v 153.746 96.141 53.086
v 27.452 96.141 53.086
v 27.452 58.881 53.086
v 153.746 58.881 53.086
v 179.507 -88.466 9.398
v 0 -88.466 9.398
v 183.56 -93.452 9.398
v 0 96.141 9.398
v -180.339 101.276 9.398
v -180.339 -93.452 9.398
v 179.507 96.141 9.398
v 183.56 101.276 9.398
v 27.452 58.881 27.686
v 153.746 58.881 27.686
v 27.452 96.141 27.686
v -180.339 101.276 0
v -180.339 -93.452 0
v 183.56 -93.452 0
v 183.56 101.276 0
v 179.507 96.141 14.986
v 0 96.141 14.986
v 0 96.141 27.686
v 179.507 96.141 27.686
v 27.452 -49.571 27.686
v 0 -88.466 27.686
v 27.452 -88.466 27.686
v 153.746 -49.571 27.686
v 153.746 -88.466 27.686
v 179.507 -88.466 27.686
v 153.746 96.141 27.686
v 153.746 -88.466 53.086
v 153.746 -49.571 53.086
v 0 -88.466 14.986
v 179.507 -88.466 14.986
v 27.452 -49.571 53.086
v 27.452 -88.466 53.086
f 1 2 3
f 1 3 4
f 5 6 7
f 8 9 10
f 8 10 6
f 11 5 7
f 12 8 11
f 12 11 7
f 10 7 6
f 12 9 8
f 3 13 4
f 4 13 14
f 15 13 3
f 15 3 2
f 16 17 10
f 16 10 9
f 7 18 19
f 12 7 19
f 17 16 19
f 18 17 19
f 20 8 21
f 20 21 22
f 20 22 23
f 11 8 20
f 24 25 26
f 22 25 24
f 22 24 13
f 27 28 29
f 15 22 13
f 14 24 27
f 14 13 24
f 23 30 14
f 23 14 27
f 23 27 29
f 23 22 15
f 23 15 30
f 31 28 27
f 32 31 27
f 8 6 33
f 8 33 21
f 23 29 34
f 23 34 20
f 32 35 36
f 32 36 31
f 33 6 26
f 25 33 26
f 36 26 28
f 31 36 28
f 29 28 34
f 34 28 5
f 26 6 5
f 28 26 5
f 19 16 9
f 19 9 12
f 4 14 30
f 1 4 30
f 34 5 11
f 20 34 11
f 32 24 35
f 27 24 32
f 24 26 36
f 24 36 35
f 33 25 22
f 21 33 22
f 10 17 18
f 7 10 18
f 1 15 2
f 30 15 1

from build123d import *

# Parameters (mm, degrees)
F1_W      = 179.506913
F1_H      = 184.607744
F2_DEPTH  = 14.986
F2_FACE_W = 179.506912
F2_FACE_H = 184.607744
F3_DEPTH  = 12.7
F4_W      = 126.293604
F4_H      = 37.260275
F4_H_2    = 38.89557
F5_DEPTH  = 25.4
F0_W      = 363.899439
F0_H      = 194.727853
F6_DEPTH  = 9.398


with BuildPart() as f2:
    # F1 (on face) → F2 (new body)
    with BuildSketch(Plane.XY):
        with Locations((89.753456, 3.837615)):
            Rectangle(F1_W, F1_H)
    extrude(amount=F2_DEPTH)

    # F2_face (on face) → F3 (join, symmetric)
    with BuildSketch(Plane(origin=(89.753456, 3.837615, 14.986), x_dir=(1, 0, 0), z_dir=(0, 0, 1))):
        Rectangle(F2_FACE_W, F2_FACE_H)
    extrude(amount=F3_DEPTH, both=True)

    # F4 (on face) → F5 (join)
    with BuildSketch(Plane.XY.offset(27.686)):
        with Locations((90.598954, 77.511349)):
            Rectangle(F4_W, F4_H)
        with Locations((90.598954, -69.018472)):
            Rectangle(F4_W, F4_H_2)
    extrude(amount=F5_DEPTH)

    # F0 (on Top) → F6 (join)
    with BuildSketch(Plane.XY):
        with Locations((1.610697, 3.912329)):
            Rectangle(F0_W, F0_H)
    extrude(amount=F6_DEPTH)


solid = f2.part
